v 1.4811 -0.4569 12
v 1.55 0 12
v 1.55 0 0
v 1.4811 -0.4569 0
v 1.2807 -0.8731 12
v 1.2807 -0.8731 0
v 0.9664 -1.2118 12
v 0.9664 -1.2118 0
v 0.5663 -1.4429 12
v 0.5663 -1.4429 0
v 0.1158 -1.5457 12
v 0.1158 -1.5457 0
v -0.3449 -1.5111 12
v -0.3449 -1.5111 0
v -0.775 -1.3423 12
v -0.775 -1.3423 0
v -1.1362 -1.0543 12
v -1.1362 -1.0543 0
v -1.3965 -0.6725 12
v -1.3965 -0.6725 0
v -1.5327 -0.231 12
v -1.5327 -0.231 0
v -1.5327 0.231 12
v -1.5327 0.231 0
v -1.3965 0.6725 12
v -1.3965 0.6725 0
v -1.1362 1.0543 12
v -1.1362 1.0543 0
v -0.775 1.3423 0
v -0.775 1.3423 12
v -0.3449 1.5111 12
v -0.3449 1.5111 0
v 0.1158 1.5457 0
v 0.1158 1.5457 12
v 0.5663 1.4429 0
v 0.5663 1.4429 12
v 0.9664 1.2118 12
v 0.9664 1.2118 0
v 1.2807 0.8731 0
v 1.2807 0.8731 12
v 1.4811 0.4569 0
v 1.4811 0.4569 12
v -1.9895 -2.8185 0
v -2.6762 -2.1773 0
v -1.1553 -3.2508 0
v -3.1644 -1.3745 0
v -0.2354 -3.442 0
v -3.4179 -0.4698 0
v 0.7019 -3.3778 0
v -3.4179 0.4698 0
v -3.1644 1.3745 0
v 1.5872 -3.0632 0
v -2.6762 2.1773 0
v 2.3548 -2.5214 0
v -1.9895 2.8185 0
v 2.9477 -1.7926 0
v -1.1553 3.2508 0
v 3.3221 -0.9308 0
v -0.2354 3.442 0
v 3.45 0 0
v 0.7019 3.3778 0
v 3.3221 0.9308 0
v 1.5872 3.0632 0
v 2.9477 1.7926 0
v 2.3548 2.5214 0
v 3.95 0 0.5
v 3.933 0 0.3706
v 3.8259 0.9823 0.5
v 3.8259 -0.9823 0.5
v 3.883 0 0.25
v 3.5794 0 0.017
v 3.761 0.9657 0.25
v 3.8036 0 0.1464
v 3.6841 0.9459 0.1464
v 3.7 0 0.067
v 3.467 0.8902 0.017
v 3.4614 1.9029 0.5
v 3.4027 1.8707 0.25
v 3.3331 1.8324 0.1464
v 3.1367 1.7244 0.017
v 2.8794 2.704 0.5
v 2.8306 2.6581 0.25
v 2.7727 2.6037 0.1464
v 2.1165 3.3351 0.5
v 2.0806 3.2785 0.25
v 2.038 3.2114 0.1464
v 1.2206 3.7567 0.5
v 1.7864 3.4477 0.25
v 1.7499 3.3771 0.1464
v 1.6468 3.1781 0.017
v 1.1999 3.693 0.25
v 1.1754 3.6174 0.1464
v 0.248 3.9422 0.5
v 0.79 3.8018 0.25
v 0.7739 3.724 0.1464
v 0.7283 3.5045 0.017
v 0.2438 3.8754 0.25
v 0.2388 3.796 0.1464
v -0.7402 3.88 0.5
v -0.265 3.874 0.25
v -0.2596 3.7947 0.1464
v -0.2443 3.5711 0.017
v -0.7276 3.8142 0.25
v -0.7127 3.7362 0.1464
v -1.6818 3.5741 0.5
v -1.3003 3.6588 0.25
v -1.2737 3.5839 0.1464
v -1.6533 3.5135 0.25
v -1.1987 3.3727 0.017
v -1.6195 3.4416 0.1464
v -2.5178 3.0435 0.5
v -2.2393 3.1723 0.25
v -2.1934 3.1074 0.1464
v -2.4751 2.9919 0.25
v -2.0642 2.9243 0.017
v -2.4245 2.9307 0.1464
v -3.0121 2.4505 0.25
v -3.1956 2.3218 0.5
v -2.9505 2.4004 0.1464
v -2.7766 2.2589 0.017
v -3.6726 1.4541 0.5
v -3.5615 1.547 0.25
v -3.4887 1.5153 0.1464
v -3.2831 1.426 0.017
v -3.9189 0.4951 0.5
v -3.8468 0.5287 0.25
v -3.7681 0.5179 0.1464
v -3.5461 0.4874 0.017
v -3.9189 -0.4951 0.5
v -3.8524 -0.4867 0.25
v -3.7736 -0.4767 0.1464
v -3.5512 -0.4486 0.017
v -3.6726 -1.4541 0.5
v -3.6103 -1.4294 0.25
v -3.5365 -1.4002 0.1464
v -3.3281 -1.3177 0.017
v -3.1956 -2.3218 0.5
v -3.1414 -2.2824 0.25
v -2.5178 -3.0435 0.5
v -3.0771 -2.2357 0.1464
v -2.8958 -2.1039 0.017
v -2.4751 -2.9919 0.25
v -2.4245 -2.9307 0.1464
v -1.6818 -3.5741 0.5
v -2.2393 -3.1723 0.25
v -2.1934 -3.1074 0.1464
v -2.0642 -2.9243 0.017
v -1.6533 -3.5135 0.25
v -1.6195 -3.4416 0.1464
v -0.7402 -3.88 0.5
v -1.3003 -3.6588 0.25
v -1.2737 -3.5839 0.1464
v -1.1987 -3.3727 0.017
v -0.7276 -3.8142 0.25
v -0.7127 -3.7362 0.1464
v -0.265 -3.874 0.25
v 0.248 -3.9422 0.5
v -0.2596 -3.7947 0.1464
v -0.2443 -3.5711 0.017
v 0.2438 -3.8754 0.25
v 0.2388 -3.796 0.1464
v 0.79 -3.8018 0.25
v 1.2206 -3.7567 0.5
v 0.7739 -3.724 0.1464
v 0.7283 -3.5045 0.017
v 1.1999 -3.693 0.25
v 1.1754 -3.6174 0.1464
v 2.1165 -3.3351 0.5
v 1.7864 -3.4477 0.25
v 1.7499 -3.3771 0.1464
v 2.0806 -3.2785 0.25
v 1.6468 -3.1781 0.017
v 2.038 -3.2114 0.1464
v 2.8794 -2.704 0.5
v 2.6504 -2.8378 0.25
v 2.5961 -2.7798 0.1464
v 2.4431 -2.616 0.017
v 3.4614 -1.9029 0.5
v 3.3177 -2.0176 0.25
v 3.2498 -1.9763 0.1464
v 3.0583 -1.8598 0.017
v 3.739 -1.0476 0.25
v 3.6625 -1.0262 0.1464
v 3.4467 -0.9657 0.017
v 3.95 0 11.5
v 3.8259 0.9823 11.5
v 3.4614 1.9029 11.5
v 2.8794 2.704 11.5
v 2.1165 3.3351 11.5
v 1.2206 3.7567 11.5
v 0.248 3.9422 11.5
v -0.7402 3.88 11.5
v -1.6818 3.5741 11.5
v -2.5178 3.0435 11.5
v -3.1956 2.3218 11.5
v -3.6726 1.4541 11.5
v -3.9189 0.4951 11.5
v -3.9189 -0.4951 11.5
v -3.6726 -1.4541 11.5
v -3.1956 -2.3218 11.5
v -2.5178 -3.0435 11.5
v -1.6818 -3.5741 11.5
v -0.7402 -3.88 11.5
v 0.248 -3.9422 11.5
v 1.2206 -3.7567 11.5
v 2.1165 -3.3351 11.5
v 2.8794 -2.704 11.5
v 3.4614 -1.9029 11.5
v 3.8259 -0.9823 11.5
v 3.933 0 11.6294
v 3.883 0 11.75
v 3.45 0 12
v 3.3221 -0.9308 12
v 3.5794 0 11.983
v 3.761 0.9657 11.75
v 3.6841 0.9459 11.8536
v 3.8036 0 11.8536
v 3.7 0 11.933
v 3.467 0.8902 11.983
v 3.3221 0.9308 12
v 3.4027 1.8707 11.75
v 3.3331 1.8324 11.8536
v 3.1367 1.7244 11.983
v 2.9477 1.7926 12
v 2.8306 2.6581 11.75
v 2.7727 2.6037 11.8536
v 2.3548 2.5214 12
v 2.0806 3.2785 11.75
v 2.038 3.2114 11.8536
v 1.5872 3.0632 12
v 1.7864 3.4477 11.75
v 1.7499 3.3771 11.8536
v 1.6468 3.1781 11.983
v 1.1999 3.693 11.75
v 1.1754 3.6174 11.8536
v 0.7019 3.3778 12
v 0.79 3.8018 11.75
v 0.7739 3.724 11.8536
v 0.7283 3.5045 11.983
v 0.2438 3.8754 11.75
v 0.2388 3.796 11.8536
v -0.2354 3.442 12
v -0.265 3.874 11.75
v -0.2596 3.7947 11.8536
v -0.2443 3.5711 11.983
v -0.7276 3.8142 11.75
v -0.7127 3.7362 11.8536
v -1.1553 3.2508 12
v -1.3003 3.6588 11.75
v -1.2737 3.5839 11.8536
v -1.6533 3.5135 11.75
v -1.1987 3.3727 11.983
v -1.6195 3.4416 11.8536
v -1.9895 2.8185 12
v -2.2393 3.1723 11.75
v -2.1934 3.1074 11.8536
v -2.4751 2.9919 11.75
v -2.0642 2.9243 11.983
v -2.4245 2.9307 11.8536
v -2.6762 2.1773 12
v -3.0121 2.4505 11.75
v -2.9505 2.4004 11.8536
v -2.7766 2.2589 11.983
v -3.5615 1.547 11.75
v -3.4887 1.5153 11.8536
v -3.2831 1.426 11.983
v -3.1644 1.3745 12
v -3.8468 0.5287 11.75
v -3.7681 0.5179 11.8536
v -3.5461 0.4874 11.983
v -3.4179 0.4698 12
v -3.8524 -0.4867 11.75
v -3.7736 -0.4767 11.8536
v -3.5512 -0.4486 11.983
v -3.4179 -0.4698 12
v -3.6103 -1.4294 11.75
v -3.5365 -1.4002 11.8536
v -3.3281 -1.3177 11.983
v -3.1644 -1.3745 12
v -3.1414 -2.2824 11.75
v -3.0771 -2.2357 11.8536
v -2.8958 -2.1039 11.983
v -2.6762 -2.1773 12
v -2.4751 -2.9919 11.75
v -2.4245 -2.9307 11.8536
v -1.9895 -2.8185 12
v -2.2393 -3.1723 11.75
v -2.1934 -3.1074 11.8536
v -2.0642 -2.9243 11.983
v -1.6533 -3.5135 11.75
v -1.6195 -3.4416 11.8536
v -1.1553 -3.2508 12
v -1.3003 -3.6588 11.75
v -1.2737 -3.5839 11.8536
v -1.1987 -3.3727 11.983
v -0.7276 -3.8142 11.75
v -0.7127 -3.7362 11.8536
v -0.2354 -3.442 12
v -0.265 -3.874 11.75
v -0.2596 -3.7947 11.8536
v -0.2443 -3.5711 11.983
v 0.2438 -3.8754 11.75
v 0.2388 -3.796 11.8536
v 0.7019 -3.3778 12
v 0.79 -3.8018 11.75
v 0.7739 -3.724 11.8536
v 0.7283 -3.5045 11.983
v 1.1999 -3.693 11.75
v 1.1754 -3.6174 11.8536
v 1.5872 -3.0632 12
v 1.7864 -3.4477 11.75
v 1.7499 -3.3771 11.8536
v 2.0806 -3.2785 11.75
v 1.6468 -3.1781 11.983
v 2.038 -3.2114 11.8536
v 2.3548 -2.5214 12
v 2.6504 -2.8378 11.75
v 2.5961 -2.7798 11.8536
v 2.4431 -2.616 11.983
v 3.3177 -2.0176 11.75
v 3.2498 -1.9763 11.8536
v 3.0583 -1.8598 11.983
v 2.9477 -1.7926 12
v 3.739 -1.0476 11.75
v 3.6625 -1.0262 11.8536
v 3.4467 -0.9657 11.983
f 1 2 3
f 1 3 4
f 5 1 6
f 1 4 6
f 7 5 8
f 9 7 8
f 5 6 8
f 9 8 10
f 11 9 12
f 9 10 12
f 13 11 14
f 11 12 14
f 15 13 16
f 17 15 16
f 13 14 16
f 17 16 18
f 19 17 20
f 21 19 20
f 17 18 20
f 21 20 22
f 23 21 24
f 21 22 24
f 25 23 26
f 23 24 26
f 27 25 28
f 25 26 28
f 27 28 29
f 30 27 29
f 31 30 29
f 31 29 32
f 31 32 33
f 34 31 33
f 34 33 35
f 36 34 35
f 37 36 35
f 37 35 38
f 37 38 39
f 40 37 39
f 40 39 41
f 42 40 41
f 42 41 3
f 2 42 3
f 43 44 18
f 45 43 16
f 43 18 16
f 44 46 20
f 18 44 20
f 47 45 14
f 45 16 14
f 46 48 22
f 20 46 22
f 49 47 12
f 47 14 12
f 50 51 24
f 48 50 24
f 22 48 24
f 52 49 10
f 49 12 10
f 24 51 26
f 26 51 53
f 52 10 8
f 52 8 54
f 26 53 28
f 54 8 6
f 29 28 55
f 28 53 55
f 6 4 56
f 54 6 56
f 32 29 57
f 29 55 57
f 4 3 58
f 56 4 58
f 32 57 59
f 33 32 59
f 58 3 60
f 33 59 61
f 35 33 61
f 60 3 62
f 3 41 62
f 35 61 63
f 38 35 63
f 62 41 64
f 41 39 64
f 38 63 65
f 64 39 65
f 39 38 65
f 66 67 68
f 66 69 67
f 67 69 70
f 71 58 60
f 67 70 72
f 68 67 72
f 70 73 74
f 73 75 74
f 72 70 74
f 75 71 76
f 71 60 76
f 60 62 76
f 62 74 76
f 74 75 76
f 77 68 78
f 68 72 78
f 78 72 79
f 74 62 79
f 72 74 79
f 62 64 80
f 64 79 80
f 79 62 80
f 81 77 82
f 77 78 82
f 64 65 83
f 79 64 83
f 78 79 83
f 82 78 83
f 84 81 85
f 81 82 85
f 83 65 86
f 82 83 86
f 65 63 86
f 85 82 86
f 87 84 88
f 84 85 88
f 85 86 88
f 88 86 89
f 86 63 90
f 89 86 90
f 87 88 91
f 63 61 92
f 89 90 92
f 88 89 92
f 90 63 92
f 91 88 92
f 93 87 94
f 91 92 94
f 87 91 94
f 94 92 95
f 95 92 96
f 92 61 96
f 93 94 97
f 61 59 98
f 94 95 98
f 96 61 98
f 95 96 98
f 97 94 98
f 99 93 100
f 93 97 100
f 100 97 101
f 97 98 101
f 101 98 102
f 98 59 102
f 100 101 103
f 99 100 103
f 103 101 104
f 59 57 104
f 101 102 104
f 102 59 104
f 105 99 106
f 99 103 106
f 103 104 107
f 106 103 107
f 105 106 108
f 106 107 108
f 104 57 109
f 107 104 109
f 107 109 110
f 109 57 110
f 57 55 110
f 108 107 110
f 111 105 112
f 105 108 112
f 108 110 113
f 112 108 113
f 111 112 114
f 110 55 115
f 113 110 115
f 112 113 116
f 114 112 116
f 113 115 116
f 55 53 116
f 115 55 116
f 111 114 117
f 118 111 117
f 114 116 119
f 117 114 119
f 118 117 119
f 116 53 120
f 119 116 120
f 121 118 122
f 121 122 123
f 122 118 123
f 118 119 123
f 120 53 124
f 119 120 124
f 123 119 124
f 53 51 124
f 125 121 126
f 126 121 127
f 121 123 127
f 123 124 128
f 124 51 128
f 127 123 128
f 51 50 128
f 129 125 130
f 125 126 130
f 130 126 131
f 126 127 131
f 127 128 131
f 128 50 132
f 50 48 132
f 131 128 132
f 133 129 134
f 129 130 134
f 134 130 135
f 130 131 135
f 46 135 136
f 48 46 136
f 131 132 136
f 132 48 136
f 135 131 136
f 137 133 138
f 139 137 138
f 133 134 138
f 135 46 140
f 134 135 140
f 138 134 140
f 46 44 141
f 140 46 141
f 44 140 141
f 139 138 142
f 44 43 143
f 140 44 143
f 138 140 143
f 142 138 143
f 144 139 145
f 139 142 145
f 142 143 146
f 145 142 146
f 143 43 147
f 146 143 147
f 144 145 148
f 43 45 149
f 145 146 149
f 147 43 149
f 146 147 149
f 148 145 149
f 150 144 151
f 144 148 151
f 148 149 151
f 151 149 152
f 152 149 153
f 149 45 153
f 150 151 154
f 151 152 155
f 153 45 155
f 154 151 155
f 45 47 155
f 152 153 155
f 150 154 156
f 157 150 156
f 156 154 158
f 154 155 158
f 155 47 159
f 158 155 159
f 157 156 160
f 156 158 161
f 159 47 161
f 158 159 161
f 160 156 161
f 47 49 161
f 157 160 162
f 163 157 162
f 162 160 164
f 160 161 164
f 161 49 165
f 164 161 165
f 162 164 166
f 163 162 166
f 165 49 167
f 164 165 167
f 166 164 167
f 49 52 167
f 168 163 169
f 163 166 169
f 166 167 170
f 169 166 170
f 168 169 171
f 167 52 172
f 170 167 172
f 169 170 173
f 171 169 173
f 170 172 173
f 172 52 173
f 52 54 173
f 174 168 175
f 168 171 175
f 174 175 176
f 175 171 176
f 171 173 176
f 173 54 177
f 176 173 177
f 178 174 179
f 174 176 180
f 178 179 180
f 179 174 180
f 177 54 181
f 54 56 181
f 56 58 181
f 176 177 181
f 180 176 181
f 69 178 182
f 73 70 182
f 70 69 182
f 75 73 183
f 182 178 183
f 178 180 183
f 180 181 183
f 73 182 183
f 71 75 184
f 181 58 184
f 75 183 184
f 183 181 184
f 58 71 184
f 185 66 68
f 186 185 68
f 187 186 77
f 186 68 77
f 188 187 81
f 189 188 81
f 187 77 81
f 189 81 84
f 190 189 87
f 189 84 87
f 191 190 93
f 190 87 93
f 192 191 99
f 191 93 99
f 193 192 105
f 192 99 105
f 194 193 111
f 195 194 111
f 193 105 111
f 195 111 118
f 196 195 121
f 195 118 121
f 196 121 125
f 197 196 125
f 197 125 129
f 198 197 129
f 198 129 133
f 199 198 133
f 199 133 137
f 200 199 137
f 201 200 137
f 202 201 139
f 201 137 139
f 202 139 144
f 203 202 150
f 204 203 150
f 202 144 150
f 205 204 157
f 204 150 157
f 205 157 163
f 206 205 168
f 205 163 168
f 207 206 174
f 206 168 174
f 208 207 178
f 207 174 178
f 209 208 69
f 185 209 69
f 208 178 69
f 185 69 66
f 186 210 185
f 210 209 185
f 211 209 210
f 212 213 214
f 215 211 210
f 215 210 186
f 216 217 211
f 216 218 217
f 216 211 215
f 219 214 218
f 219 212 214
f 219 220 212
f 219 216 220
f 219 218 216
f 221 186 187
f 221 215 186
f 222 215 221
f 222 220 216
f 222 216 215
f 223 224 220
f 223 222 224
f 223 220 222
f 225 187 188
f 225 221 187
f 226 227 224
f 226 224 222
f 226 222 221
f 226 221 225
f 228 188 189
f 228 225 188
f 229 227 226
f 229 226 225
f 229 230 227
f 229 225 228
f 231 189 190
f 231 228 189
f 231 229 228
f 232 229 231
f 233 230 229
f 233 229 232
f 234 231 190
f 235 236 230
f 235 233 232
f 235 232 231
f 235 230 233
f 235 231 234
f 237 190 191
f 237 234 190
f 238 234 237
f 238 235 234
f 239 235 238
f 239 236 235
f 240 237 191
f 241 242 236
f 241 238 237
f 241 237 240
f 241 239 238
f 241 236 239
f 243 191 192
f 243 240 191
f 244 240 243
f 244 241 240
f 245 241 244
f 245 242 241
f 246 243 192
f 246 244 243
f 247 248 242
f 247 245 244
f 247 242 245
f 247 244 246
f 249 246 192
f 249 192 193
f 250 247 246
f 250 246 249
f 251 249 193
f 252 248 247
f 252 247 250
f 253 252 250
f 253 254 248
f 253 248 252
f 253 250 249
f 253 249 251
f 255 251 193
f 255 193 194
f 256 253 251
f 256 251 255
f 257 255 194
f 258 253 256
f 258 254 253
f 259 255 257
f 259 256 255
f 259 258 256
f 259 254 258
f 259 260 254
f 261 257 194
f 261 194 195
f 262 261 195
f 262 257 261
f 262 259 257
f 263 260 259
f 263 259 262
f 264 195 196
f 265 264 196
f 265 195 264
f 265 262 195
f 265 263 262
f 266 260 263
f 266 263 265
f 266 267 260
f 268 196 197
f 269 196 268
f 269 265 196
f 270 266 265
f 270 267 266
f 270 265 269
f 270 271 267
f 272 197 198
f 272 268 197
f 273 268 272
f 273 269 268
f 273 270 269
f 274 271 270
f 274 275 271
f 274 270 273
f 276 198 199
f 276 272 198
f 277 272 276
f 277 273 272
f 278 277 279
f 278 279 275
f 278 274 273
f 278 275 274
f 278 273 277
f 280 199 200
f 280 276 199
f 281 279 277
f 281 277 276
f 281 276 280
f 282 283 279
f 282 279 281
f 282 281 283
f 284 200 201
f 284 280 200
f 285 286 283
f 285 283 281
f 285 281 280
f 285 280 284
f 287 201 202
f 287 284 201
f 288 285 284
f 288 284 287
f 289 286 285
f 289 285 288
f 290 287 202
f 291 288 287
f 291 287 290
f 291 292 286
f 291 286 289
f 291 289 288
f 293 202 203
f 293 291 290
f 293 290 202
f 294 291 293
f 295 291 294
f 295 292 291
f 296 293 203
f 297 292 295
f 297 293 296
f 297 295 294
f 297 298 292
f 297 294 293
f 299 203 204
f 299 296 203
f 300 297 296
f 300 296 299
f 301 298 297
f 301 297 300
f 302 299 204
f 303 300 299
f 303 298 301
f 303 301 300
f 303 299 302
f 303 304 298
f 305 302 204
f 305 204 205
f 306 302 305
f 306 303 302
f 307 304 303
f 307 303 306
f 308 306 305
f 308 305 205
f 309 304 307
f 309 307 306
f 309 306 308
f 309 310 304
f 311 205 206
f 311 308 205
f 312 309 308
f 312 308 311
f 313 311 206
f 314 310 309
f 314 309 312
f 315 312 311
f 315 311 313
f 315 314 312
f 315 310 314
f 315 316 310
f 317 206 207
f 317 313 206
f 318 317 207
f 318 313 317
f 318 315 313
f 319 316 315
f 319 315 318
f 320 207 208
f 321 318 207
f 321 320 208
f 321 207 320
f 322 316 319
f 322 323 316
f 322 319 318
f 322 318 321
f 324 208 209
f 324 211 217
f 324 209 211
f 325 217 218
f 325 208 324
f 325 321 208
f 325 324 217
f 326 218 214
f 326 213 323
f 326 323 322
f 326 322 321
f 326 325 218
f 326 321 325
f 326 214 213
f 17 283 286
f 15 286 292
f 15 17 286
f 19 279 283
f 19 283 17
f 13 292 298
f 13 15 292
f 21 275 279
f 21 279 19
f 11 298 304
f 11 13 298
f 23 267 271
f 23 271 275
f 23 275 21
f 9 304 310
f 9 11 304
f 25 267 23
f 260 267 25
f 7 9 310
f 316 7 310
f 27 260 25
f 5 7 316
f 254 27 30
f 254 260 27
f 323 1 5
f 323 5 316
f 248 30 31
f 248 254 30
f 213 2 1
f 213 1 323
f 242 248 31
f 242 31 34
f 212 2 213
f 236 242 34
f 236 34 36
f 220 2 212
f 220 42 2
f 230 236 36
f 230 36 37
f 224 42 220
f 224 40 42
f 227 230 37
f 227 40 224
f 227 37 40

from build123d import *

# Parameters (mm, degrees)
F0_R     = 3.95
F1_DEPTH = 12
F2_R     = 1.55
F3_DEPTH = 12.001
F4_R     = 0.5


with BuildPart() as f1:
    # F0 (on Top) → F1 (new body)
    with BuildSketch(Plane.XY):
        Circle(F0_R)
    extrude(amount=F1_DEPTH)

    # F2 (on face) → F3 (cut, through all)
    with BuildSketch(Plane(origin=(0, 0, 0), x_dir=(1, 0, 0), z_dir=(0, 0, -1))):
        Circle(F2_R)
    extrude(amount=-F3_DEPTH, mode=Mode.SUBTRACT)

    # F4
    f4_edges = [f1.edges().sort_by_distance(p)[0] for p in [
        (-3.95, 0, 0),
        (-3.95, 0, 12),
    ]]
    fillet(f4_edges, radius=F4_R)


solid = f1.part
